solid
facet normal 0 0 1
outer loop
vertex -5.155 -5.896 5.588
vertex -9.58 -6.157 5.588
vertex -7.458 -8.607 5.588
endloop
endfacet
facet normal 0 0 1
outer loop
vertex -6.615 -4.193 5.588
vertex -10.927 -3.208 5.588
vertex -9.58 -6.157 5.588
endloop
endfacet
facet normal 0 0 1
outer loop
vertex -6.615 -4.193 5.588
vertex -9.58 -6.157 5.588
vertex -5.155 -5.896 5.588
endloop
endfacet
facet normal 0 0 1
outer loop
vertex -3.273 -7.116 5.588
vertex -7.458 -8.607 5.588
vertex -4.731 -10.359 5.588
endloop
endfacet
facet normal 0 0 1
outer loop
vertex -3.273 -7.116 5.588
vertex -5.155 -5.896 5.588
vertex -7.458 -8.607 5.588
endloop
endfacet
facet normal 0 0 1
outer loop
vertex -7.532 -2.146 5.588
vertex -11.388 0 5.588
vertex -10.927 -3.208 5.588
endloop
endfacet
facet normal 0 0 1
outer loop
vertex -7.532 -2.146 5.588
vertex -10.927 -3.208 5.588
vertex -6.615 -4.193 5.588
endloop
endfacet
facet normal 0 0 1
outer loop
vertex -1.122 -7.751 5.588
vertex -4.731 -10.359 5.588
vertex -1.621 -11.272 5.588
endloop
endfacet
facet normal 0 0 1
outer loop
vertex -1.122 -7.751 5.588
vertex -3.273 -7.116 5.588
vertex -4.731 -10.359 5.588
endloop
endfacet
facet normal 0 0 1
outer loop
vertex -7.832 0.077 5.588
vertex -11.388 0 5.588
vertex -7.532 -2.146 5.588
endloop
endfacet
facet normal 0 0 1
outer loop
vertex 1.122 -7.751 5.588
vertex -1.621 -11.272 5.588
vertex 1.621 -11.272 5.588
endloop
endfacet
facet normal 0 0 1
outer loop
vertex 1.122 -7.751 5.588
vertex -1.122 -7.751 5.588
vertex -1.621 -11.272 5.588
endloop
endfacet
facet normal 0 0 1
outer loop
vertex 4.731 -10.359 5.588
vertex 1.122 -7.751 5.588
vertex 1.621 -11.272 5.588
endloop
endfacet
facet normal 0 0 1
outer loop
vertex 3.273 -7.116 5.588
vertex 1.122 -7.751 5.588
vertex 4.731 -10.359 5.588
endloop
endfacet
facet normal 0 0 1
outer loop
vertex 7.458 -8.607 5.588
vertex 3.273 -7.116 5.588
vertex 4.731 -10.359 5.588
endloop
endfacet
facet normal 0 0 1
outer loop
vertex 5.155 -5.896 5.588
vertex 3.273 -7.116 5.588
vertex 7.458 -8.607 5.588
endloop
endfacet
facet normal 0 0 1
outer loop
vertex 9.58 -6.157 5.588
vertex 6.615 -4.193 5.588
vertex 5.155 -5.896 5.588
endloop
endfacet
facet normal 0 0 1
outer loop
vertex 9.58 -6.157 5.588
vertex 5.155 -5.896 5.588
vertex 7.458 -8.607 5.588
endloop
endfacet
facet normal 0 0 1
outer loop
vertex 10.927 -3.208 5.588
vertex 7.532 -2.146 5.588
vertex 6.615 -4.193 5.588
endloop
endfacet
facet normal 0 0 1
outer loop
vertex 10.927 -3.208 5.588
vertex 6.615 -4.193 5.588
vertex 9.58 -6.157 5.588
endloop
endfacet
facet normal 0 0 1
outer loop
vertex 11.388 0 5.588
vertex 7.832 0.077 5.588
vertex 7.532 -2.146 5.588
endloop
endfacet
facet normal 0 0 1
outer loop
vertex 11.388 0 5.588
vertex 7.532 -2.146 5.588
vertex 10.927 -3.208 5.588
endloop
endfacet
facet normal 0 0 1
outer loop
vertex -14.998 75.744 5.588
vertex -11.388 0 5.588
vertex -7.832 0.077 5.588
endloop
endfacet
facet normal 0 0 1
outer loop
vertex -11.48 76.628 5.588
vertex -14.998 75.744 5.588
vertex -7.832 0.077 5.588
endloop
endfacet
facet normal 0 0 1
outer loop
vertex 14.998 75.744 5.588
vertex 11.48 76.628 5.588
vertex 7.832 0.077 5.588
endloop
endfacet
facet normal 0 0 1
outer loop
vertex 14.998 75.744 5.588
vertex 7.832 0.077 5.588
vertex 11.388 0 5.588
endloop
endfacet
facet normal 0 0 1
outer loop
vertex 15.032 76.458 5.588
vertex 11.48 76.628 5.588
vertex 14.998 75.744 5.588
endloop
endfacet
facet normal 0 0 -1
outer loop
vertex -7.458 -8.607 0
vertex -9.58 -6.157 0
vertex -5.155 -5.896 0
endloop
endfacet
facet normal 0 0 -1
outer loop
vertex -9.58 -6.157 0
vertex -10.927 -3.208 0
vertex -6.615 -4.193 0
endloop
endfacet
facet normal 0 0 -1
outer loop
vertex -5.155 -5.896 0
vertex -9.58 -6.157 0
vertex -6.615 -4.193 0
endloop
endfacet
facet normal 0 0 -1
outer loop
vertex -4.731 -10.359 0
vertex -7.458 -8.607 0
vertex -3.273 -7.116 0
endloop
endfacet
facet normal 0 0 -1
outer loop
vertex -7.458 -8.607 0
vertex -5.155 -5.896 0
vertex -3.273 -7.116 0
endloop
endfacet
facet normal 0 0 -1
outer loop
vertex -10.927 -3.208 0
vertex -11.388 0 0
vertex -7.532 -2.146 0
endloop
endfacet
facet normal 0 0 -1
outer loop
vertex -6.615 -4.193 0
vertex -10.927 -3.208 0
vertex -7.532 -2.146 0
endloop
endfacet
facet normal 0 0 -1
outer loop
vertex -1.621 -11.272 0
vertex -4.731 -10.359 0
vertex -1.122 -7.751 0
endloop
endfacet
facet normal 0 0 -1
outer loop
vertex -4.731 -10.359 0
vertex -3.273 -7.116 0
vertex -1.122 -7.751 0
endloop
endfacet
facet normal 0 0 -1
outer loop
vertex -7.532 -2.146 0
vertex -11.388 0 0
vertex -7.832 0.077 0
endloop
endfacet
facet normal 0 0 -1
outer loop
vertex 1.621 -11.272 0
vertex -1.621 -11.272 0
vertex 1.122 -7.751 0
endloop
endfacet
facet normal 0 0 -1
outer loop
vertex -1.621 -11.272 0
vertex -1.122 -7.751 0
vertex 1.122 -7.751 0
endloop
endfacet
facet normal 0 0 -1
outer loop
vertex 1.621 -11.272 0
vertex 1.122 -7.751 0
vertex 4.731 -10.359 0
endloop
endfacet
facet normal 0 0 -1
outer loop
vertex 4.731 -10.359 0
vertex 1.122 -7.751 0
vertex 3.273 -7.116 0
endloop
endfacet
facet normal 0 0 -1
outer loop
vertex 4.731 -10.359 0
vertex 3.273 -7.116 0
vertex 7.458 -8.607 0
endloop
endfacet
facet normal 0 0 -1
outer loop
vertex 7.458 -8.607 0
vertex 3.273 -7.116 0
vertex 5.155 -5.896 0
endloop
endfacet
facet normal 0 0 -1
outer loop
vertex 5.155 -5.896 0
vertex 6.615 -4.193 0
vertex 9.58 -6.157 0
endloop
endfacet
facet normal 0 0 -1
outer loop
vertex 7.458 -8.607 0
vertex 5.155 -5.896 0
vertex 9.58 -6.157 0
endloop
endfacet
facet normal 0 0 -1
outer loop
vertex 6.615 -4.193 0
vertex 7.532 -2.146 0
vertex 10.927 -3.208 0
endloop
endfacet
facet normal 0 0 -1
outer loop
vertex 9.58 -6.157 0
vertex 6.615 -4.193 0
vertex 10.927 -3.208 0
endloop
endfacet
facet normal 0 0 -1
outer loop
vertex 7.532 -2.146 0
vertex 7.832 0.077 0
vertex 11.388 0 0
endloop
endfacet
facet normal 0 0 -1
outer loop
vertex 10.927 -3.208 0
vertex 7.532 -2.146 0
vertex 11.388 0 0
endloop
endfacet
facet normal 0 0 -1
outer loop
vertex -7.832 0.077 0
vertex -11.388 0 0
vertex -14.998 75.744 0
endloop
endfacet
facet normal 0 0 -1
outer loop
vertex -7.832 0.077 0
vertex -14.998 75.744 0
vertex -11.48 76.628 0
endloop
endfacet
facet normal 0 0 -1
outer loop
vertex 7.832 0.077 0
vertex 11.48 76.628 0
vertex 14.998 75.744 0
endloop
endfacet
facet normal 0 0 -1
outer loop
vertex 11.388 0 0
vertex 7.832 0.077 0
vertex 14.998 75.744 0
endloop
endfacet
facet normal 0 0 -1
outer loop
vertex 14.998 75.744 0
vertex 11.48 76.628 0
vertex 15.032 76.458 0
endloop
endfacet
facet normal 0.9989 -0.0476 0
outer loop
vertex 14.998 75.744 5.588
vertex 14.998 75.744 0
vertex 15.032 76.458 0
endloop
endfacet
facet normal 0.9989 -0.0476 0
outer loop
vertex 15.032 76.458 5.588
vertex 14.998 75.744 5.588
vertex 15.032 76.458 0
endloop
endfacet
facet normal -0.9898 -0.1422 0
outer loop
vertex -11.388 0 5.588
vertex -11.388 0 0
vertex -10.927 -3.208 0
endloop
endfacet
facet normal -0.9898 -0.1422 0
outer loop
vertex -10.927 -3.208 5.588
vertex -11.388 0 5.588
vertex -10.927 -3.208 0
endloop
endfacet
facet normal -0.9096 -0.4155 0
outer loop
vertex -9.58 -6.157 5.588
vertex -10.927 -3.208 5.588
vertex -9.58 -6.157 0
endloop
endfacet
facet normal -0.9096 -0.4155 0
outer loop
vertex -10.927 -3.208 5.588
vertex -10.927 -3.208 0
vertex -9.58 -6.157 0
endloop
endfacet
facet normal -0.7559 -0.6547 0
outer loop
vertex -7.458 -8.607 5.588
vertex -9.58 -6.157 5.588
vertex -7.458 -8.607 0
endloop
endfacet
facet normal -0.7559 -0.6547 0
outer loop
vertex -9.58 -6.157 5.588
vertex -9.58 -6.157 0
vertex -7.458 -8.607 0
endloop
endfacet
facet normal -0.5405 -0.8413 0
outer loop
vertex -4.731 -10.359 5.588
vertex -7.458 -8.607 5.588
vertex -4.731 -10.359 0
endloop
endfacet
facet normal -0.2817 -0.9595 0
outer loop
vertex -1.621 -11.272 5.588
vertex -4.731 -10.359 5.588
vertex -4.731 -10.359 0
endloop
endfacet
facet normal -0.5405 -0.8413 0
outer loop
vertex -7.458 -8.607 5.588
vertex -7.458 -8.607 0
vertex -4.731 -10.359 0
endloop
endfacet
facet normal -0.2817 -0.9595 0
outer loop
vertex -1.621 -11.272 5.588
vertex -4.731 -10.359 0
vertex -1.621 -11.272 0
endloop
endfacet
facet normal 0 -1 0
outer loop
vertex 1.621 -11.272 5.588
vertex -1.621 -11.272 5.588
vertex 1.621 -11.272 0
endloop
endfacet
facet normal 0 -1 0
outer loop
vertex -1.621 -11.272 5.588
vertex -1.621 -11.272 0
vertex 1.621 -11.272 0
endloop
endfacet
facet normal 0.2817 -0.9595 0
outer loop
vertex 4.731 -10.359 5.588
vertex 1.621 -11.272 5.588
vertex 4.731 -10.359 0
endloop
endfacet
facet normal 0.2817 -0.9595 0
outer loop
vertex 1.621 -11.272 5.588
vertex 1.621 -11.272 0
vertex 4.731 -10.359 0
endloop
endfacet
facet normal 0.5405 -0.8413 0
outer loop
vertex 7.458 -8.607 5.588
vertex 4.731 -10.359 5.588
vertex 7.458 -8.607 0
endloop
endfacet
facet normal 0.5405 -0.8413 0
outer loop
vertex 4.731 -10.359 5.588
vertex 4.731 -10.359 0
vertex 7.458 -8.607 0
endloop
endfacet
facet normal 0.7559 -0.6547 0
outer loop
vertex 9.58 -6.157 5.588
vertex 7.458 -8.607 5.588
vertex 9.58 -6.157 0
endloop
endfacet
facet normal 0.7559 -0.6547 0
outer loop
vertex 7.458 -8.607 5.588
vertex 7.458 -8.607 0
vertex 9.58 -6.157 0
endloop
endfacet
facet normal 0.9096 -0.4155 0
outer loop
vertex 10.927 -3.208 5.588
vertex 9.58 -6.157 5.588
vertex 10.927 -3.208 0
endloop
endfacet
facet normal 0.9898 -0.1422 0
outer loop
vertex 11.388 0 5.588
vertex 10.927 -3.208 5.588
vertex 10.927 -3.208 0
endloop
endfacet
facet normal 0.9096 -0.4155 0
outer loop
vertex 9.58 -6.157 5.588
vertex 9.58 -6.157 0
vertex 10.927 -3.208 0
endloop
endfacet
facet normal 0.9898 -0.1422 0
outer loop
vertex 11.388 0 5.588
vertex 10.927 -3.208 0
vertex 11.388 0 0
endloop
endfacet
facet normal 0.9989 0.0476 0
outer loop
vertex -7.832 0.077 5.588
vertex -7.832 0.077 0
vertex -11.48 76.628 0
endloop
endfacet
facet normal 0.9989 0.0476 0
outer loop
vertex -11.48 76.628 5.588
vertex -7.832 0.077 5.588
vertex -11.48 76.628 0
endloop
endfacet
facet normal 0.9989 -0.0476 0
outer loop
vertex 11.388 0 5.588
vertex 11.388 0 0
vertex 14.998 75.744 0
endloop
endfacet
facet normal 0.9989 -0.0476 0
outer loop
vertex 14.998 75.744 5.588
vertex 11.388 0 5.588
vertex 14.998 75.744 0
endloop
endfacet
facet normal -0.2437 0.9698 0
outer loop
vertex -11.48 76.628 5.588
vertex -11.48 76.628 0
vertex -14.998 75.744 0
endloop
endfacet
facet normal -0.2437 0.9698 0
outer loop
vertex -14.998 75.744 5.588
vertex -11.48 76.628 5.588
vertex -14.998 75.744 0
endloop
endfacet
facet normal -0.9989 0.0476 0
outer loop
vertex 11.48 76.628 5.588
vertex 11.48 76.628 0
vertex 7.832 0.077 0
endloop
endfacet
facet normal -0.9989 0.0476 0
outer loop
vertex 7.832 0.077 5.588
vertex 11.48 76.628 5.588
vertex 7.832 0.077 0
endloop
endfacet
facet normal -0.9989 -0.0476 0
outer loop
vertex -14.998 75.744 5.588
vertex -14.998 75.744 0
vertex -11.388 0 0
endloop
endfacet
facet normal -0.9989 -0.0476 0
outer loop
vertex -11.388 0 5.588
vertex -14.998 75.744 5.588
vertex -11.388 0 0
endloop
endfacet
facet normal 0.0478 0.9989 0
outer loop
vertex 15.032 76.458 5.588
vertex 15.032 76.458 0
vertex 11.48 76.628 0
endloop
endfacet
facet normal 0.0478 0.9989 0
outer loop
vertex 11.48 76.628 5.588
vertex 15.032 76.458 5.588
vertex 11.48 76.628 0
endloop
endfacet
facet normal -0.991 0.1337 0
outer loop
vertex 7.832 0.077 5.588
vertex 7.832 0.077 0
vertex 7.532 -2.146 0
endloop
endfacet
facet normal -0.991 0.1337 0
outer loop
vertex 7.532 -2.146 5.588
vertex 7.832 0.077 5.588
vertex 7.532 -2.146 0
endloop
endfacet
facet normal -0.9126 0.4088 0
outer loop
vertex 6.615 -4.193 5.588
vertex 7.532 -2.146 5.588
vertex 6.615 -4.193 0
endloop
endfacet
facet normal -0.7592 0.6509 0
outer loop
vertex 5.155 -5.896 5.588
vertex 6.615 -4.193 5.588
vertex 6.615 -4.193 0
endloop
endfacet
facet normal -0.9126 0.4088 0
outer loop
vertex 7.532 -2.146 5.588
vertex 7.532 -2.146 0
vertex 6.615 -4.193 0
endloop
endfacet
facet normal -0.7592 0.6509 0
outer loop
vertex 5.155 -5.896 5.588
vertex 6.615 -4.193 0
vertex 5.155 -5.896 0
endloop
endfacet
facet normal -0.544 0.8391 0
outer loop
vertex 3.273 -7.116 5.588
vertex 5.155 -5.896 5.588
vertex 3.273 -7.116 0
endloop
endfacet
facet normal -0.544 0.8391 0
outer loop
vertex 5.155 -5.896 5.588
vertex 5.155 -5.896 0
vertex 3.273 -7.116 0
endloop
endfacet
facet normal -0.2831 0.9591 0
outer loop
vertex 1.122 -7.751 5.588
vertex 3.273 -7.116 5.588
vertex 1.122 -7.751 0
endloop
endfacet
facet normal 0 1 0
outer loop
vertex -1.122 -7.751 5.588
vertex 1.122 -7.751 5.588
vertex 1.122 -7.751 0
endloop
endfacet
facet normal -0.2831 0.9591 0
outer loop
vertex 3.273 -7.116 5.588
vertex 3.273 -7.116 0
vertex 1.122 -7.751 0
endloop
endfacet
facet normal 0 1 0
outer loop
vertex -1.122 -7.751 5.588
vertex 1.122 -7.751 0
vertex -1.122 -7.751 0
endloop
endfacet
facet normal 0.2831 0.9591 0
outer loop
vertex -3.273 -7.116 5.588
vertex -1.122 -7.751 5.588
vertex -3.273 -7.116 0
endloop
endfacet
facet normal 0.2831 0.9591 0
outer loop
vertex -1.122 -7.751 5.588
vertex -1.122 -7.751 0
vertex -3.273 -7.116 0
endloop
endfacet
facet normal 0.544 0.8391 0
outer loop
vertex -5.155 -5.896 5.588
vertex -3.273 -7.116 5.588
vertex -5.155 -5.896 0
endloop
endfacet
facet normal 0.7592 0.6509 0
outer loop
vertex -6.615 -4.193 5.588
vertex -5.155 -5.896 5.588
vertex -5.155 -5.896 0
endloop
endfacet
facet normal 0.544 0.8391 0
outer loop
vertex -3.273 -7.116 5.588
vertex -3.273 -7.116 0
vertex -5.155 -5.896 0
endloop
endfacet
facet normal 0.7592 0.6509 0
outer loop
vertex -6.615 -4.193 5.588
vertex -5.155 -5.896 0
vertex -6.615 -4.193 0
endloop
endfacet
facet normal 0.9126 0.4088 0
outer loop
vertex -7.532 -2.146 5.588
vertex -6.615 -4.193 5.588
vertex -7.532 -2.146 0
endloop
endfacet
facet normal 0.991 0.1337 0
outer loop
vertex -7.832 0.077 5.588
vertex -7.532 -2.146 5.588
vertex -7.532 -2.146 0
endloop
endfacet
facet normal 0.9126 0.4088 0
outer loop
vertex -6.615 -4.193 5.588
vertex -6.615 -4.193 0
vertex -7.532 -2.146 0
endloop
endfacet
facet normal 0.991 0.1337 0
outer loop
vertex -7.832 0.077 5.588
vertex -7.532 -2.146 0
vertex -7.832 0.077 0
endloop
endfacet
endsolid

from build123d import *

# Parameters (mm, degrees)
F1_DEPTH = 5.588


with BuildPart() as f1:
    # F0 (on Top) → F1 (new body)
    with BuildSketch(Plane.XY):
        with BuildLine():
            Line((-14.997657, 75.743783), (-11.388115, 0))
            ThreePointArc((-11.388115, 0), (0, -11.388115), (11.388115, 0))
            Line((11.388115, 0), (14.997657, 75.743783))
            Line((14.997657, 75.743783), (15.031717, 76.458491))
            Line((15.031717, 76.458491), (11.479748, 76.627759))
            Line((11.479748, 76.627759), (7.831738, 0.076784))
            ThreePointArc((7.831738, 0.076784), (0, -7.832115), (-7.831738, 0.076784))
            Line((-7.831738, 0.076784), (-11.479748, 76.627759))
            Line((-11.479748, 76.627759), (-14.997657, 75.743783))
        make_face()
    extrude(amount=F1_DEPTH)


solid = f1.part
